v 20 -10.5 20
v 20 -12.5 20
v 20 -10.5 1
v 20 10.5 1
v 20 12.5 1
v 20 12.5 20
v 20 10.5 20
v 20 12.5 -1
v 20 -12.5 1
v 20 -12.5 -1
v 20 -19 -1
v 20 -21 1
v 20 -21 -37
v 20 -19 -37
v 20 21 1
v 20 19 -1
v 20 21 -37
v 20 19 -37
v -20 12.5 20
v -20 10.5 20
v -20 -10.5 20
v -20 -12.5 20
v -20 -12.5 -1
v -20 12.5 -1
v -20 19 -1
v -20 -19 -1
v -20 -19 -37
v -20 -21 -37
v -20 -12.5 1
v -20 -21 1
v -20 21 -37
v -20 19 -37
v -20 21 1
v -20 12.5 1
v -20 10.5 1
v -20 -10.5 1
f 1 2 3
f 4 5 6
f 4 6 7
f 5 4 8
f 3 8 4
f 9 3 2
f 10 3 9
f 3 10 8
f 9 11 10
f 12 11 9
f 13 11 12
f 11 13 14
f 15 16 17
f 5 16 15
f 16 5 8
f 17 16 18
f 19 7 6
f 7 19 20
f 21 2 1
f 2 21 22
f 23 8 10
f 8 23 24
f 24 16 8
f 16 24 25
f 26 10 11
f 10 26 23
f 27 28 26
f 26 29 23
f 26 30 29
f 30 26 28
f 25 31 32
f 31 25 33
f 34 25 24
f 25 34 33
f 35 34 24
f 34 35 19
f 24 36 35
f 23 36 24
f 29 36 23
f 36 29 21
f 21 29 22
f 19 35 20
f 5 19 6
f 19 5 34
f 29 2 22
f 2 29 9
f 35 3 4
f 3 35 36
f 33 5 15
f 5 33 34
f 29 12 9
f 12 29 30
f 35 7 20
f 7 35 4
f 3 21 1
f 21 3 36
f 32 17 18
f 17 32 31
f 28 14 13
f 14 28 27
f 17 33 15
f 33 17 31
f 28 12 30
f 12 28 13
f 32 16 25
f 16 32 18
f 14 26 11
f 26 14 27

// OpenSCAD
/**

Brackets for Ikea LÖNSET Slatted bed base,
@idnorton

Licenced as Creative Commons Attribution Non Commercial 3.0
See https://creativecommons.org/licenses/by-nc/3.0/

Specifically you may not sell the design or products using the design.
You're welcome to use the design to build things for your own use :)

**/

length = 40;
thickness = 2;
width_top = 21;
width_bottom = 38;

difference() {
    // Top outer
    translate([-(length/2), -((width_top + 2*thickness)/2), -(thickness/2)]) {
        cube([length, width_top + (2 * thickness), width_top]); 
    }
    
    // Top slot
    translate([-(length/2), -(width_top/2), (thickness/2)]) {
        cube([length, width_top, width_top]);
    }
}

difference() {
    // Bottom outer
    translate([-(length/2), -(width_bottom + 2*thickness)/2, -(width_bottom - (thickness/2))]) { 
        cube([length, width_bottom + (2 * thickness), width_bottom]); 
    }
    
    // Bottom slot
    translate([-(length/2), -(width_bottom/2), -(width_bottom + (thickness/2))]) {
        cube([length, width_bottom, width_bottom]);
    }
}
